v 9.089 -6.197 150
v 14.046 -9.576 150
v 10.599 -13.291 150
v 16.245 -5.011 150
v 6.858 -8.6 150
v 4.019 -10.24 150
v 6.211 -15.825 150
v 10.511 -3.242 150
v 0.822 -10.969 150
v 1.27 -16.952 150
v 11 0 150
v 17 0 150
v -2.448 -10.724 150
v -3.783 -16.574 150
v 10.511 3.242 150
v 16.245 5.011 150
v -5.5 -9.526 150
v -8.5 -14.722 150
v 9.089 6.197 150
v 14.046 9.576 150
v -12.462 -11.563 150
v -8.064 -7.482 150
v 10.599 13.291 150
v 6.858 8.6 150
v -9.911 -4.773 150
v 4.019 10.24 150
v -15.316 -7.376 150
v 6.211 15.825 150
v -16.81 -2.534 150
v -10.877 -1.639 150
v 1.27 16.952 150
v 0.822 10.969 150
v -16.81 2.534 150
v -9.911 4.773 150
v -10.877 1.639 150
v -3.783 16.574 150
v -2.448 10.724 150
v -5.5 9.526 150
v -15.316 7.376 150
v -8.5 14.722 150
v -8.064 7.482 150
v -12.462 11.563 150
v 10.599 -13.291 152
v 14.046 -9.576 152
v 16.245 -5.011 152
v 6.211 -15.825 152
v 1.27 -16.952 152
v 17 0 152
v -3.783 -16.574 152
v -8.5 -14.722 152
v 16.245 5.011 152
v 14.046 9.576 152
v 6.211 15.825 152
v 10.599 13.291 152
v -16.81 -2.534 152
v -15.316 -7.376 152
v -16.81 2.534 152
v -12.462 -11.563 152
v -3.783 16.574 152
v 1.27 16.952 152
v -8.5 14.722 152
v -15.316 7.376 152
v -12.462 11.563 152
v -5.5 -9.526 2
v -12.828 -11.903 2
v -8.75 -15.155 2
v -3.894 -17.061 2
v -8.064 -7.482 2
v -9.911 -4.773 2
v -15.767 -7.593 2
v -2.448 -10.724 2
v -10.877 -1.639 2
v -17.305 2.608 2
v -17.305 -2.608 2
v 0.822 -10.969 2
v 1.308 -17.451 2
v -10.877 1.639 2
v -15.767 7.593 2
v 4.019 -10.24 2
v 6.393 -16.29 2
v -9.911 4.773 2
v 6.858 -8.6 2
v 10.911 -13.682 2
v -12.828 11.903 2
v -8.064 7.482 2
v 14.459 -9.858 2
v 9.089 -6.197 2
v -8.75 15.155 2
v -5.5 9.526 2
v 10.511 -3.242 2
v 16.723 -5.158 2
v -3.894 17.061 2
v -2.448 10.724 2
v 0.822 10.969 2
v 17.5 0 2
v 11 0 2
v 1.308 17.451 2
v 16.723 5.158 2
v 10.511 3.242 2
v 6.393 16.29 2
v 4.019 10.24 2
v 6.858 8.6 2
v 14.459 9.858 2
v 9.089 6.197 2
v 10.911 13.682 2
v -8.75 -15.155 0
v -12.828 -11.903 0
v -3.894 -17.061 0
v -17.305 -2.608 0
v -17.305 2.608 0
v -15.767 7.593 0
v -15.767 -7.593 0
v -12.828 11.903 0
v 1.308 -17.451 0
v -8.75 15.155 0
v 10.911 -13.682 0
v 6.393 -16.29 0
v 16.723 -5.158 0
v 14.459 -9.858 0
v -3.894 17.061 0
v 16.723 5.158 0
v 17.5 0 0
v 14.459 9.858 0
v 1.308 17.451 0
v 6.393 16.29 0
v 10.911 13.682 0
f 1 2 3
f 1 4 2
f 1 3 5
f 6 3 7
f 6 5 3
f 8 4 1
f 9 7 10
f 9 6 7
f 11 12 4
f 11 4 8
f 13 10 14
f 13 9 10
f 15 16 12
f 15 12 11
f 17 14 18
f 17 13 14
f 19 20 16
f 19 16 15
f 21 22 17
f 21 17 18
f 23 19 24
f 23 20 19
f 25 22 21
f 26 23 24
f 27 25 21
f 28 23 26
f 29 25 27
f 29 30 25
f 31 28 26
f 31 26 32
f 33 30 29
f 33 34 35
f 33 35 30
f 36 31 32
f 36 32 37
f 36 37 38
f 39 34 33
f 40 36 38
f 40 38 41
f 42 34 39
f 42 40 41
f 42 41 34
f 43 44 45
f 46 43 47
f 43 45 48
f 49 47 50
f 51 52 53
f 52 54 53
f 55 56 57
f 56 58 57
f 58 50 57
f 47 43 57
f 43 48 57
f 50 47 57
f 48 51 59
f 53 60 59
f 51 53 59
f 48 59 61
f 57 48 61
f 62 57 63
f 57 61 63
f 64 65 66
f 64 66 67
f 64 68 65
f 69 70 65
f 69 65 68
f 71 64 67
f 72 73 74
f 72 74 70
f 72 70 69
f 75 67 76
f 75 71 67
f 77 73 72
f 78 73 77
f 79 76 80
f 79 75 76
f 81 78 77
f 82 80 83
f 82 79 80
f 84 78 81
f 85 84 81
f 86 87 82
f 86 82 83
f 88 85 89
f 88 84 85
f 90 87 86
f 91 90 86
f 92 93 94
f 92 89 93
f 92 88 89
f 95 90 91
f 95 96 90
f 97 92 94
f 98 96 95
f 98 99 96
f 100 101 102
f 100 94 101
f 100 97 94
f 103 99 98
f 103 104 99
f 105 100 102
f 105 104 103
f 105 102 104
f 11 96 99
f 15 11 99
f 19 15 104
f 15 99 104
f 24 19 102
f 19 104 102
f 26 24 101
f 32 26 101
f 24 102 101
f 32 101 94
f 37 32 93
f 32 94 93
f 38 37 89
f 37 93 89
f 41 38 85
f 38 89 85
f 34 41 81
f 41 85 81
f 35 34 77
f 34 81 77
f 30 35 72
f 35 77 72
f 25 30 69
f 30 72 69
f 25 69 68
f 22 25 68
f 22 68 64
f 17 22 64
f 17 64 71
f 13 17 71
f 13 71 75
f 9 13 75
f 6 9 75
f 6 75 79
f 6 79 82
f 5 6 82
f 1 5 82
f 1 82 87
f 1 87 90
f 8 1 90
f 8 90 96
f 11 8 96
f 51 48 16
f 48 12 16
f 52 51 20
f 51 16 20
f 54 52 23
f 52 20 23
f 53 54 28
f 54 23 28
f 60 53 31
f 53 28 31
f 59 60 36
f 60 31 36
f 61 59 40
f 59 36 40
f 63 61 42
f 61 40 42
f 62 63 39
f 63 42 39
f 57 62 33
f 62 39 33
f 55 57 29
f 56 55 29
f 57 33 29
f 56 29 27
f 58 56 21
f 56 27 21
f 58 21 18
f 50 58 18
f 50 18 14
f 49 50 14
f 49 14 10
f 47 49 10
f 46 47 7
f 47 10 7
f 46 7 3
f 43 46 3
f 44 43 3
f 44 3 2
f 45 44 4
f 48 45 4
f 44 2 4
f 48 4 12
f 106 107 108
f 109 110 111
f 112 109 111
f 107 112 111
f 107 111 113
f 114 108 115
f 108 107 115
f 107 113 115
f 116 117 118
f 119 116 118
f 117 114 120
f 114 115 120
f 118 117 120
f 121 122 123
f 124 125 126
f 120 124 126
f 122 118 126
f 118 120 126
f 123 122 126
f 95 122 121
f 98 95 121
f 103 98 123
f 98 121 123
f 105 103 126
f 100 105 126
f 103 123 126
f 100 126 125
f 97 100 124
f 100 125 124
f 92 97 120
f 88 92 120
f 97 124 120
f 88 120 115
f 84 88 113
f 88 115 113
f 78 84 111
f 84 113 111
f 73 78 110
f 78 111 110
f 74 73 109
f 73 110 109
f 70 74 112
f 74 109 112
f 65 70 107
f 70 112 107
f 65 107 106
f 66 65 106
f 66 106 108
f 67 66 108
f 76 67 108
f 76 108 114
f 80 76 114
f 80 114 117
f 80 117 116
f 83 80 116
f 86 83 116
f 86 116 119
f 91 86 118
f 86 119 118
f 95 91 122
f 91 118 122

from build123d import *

# Parameters (mm, degrees)
ESQUISSE1_R        = 17.5
BOSS_EXTRU_1_DEPTH = 2
ESQUISSE2_R        = 11
BOSS_EXTRU_2_DEPTH = 150
ESQUISSE3_W        = 6
ESQUISSE3_H        = 2


with BuildPart() as part:
    # Esquisse1 → Boss.-Extru.1 (new body)
    with BuildSketch(Plane.XY):
        Circle(ESQUISSE1_R)
    extrude(amount=BOSS_EXTRU_1_DEPTH)

    # Esquisse2 → Boss.-Extru.2 (add)
    with BuildSketch(Plane.XY.offset(2)):
        Circle(ESQUISSE2_R)
    extrude(amount=BOSS_EXTRU_2_DEPTH)

    # Esquisse3 → Révolution1 (revolve)
    with BuildSketch(Plane(origin=(0, 0, 0), x_dir=(1, 0, 0), z_dir=(0, 1, 0))):
        with Locations((14, -151)):
            Rectangle(ESQUISSE3_W, ESQUISSE3_H)
    revolve(axis=Axis((0, 0, 137.220154247), (0, 0, 1)))


solid = part.part
